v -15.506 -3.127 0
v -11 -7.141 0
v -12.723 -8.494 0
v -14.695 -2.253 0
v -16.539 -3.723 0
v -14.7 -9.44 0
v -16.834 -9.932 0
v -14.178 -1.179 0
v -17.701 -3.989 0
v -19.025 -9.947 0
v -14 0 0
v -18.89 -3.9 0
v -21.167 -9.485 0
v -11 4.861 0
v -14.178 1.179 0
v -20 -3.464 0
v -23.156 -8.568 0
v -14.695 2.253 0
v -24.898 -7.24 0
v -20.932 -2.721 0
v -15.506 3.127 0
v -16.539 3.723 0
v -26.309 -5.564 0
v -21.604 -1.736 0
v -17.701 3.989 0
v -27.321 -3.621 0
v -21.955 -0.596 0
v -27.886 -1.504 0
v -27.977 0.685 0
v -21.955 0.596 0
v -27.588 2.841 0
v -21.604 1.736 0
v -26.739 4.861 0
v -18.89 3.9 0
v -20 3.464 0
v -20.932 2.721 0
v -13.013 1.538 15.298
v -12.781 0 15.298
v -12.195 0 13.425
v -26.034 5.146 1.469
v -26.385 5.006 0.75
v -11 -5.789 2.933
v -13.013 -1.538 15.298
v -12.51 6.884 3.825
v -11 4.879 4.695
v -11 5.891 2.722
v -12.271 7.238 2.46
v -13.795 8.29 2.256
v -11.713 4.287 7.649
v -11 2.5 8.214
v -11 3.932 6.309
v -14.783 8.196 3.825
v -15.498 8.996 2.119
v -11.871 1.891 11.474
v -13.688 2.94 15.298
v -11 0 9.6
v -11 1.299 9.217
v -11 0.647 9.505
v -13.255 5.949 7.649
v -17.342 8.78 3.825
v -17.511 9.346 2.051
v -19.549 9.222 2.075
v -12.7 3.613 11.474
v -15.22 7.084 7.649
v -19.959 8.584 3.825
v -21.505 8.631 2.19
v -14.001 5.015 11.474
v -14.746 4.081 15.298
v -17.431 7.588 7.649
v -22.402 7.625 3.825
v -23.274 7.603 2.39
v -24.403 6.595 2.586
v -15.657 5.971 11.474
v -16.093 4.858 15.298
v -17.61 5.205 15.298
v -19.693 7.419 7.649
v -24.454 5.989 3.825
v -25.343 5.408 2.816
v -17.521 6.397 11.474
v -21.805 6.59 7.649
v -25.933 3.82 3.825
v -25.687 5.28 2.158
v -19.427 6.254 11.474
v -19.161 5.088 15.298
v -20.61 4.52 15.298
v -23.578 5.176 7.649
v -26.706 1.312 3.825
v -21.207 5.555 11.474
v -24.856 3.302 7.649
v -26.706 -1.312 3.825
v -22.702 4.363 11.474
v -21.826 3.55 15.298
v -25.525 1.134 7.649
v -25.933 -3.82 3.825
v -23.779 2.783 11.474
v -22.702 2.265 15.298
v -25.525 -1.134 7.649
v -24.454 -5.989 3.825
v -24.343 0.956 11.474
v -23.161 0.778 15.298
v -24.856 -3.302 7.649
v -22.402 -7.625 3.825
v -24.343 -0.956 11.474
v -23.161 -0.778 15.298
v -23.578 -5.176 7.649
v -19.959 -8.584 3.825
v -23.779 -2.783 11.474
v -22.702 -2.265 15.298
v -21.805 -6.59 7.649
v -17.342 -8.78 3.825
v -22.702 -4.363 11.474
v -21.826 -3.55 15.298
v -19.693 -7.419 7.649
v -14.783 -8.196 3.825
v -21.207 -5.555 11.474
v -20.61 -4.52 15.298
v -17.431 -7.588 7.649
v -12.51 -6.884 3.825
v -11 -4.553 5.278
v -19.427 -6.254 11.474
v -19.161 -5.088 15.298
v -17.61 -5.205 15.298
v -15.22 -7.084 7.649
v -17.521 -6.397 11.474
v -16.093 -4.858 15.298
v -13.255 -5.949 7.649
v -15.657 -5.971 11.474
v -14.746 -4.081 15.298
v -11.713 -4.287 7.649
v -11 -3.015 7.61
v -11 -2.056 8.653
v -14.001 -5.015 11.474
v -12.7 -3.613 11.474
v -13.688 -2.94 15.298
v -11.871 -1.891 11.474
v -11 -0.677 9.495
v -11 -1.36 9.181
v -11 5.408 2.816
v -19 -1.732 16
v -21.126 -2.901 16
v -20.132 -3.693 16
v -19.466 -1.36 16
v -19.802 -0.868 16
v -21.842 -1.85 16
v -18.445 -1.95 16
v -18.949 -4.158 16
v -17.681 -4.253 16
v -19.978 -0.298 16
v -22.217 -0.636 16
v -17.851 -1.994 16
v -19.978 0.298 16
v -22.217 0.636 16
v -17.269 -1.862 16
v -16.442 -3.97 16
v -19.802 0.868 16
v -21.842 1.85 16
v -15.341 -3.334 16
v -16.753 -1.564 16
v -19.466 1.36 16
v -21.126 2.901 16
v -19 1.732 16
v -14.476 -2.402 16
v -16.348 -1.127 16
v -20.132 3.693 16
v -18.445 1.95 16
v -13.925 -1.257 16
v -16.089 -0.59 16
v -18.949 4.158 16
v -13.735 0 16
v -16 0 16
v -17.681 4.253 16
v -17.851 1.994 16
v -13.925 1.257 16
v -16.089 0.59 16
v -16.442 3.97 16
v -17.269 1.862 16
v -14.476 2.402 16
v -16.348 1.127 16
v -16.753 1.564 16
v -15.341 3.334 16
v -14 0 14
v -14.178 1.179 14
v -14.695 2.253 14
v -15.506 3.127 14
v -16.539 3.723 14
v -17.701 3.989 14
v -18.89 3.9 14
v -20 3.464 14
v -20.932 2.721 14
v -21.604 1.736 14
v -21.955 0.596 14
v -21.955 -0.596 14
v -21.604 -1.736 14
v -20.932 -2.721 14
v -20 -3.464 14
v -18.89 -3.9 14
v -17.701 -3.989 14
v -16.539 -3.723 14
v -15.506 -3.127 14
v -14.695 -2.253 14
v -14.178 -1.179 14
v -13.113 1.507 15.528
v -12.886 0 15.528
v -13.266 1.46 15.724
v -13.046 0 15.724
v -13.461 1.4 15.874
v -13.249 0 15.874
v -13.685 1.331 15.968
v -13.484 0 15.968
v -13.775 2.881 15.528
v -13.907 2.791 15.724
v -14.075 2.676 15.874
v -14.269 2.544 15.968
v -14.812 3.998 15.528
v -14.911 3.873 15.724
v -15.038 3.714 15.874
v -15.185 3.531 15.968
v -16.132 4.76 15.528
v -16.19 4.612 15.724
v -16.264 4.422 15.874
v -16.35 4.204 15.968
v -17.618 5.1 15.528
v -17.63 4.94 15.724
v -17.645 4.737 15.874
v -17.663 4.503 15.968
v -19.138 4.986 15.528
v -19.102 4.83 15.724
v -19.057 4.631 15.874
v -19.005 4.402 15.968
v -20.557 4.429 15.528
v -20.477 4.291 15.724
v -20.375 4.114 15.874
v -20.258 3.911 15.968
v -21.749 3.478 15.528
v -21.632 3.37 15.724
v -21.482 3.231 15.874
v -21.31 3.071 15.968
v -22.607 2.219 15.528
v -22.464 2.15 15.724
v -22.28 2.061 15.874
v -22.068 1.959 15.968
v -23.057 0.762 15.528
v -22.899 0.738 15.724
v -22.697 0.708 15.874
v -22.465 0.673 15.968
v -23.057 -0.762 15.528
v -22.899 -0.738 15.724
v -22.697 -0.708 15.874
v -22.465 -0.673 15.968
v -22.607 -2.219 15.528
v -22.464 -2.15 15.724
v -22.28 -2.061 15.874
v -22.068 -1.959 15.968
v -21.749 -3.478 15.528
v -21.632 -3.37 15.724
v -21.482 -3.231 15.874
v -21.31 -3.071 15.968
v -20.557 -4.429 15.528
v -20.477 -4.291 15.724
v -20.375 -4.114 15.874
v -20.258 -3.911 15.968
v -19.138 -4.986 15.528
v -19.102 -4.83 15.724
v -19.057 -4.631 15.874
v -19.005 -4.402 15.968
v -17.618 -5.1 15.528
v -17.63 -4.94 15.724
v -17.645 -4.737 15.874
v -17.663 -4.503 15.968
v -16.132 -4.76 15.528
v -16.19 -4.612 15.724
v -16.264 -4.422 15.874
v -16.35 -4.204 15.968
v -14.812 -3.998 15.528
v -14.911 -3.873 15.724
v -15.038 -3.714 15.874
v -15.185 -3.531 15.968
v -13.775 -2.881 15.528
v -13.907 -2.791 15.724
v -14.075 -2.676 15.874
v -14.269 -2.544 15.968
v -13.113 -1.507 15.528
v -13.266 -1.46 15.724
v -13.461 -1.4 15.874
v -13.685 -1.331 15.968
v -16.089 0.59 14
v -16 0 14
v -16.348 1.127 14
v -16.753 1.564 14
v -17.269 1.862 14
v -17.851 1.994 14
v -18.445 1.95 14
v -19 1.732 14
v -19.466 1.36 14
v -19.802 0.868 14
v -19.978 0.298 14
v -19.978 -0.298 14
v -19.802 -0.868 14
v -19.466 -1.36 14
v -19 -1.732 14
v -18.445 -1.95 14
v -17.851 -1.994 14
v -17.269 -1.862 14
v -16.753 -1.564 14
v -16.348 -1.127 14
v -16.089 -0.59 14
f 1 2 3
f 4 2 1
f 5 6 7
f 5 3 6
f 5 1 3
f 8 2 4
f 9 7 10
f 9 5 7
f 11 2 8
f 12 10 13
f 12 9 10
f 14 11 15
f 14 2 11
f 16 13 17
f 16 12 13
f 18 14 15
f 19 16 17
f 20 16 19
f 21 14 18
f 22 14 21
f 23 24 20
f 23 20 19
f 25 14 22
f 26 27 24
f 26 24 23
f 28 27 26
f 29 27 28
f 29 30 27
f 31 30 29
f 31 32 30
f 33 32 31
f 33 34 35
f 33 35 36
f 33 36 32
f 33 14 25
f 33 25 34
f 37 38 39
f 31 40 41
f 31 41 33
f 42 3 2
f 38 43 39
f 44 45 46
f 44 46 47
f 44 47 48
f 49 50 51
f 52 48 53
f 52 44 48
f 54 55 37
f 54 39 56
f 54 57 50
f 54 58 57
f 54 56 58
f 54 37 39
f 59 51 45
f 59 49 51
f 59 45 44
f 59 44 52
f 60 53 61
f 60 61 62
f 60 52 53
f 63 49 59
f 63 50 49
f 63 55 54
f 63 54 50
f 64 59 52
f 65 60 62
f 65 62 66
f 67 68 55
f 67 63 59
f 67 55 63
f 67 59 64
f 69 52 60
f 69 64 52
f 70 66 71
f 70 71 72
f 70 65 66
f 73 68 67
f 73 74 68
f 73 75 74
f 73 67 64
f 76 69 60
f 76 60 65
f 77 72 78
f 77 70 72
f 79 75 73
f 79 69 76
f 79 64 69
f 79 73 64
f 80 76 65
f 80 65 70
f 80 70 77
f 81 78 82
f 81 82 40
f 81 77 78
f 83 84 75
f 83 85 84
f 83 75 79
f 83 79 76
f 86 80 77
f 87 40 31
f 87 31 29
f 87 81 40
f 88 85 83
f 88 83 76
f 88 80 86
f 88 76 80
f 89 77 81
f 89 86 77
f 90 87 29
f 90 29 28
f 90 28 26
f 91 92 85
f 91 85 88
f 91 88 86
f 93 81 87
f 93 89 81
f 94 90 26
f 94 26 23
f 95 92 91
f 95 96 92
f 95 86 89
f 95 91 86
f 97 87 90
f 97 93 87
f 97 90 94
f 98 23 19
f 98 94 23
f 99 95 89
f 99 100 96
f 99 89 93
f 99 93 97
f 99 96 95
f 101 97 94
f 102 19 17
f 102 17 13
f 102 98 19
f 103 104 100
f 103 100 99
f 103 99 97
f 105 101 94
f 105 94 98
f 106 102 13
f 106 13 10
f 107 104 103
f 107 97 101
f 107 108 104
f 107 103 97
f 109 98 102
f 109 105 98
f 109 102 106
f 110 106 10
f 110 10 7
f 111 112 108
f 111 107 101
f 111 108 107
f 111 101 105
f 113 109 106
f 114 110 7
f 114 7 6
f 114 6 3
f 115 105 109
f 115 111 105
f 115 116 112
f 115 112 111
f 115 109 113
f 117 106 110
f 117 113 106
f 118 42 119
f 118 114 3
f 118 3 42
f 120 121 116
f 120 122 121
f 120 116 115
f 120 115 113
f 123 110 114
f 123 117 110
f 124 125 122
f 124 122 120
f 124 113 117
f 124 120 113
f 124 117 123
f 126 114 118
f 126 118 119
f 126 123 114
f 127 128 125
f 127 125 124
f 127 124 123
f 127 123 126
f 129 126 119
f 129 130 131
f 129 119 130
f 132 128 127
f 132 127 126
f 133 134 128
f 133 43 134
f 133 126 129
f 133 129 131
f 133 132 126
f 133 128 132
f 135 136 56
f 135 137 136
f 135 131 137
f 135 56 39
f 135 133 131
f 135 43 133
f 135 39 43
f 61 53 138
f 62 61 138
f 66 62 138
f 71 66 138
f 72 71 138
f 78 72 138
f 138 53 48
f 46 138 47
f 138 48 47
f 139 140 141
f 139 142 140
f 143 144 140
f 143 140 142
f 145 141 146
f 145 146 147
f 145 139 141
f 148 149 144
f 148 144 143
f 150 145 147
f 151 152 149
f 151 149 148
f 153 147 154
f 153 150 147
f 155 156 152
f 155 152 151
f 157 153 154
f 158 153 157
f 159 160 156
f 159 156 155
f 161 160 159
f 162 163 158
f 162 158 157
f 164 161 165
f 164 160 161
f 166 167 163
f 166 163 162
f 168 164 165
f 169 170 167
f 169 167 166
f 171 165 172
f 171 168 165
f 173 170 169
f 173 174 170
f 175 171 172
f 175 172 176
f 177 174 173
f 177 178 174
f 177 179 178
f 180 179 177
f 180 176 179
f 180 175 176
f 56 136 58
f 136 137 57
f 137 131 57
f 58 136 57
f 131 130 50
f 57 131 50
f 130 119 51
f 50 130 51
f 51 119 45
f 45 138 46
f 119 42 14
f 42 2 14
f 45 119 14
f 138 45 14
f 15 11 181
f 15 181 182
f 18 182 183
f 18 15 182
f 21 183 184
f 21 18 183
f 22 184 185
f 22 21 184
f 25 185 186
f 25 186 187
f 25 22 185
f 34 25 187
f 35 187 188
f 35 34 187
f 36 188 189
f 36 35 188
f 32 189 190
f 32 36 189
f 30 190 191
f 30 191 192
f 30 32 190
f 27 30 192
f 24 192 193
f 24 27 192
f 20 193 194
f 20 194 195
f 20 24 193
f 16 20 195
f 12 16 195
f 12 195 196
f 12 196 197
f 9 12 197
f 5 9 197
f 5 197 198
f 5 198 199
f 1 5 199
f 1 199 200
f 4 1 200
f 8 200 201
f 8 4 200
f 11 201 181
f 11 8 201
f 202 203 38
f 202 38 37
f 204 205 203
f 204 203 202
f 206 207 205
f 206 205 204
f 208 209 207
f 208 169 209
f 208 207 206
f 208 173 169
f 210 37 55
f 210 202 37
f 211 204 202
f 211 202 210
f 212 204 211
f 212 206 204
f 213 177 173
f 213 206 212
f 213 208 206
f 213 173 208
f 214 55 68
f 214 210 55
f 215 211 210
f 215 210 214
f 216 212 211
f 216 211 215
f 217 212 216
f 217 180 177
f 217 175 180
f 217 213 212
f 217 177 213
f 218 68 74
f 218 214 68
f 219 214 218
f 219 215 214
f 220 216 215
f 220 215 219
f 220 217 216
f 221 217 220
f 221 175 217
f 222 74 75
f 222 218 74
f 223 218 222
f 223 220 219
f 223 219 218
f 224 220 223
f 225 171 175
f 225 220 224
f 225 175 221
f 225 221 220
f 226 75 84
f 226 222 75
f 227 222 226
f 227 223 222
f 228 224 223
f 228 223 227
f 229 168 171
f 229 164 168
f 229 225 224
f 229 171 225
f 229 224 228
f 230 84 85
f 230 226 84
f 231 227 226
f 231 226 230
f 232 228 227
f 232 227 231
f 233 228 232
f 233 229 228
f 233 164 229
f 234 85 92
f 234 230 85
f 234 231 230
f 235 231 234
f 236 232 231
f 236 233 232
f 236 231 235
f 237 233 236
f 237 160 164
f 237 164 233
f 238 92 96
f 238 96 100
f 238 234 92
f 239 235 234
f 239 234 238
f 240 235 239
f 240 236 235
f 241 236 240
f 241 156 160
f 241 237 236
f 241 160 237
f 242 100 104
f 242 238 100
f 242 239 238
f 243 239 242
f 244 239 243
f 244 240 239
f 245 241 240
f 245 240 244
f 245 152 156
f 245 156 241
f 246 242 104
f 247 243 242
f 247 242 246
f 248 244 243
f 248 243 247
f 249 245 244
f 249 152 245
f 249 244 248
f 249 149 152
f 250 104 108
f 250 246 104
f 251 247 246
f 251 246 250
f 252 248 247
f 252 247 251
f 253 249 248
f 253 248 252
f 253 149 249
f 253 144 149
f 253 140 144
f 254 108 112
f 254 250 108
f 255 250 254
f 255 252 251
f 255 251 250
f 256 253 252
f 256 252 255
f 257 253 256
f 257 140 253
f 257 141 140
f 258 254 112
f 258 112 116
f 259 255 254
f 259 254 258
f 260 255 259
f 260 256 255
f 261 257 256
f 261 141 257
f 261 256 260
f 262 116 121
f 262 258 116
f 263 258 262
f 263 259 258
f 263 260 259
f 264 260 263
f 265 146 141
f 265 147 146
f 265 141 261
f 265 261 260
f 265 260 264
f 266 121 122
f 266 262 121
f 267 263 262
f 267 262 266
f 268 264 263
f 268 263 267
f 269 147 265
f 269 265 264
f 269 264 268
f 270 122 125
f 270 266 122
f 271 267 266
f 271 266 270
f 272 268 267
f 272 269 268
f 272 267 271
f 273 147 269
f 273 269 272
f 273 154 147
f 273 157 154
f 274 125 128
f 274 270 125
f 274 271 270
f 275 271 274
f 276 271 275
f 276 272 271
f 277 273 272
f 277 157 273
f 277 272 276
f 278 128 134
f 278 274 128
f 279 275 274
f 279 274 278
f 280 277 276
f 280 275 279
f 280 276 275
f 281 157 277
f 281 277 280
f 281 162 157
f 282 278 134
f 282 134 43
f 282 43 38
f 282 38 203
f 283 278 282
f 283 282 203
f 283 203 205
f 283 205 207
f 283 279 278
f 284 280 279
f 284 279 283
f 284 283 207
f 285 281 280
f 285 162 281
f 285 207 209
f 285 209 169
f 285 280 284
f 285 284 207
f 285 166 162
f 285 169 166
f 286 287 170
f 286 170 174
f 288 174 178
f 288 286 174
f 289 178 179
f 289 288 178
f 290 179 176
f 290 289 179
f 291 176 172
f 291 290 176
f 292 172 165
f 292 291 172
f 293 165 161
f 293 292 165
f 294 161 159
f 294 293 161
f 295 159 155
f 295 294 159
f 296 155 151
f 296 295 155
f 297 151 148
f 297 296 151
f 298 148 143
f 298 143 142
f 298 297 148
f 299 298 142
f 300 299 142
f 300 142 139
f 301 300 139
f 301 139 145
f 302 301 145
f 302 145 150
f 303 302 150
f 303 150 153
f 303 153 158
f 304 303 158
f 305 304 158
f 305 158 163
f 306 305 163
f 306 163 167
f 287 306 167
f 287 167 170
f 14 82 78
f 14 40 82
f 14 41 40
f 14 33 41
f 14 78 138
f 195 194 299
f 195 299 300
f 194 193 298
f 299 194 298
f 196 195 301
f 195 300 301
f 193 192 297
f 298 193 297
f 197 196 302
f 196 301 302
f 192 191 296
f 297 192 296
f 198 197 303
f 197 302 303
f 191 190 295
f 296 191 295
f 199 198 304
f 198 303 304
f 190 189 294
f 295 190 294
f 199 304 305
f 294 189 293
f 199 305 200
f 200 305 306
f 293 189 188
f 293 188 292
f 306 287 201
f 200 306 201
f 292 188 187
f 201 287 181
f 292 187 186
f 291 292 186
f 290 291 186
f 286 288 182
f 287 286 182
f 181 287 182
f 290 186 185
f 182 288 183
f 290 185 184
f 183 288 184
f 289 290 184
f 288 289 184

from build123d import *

# Parameters (mm, degrees)
CYLINDER003_R     = 2
CYLINDER003_DEPTH = 16
CYLINDER004_R     = 4
CYLINDER004_DEPTH = 14
BOX001_W          = 30
BOX001_H          = 10
BOX001_DEPTH      = 10
FILLET002_R       = 1
BOX002_W          = 10
BOX002_H          = 30
BOX002_DEPTH      = 20


with BuildPart() as part:
    # Cone → Cone (revolve)
    with BuildSketch(Plane.XZ):
        Polygon((0, 0), (10, 0), (5, 16), (0, 16), align=None)
    revolve(axis=Axis((0, 0, 0), (0, 0, 1)))

    # Cylinder003 → Cylinder003 (cut)
    with BuildSketch(Plane.XY):
        Circle(CYLINDER003_R)
    extrude(amount=CYLINDER003_DEPTH, mode=Mode.SUBTRACT)

    # Cylinder004 → Cylinder004 (cut)
    with BuildSketch(Plane.XY):
        Circle(CYLINDER004_R)
    extrude(amount=CYLINDER004_DEPTH, mode=Mode.SUBTRACT)

    # Box001 → Box001 (cut)
    with BuildSketch(Plane(origin=(-15, 3.5, -7), x_dir=(1, 0, 0), z_dir=(0, 0.190809, 0.981627))):
        with Locations((15, 5)):
            Rectangle(BOX001_W, BOX001_H)
    extrude(amount=BOX001_DEPTH, mode=Mode.SUBTRACT)

    # Fillet002
    fillet002_edges = [part.edges().sort_by_distance(p)[0] for p in [
        (-5, 0, 16),
    ]]
    fillet(fillet002_edges, radius=FILLET002_R)

    # Box002 → Box002 (cut)
    with BuildSketch(Plane(origin=(7, -15, 0), x_dir=(1, 0, 0), z_dir=(0, 0, 1))):
        with Locations((5, 15)):
            Rectangle(BOX002_W, BOX002_H)
    extrude(amount=BOX002_DEPTH, mode=Mode.SUBTRACT)


with BuildPart() as part_1:
    # Body001 placement: moved
    add(part.part.moved(Location((-18, 0, 0))))


solid = part_1.part
